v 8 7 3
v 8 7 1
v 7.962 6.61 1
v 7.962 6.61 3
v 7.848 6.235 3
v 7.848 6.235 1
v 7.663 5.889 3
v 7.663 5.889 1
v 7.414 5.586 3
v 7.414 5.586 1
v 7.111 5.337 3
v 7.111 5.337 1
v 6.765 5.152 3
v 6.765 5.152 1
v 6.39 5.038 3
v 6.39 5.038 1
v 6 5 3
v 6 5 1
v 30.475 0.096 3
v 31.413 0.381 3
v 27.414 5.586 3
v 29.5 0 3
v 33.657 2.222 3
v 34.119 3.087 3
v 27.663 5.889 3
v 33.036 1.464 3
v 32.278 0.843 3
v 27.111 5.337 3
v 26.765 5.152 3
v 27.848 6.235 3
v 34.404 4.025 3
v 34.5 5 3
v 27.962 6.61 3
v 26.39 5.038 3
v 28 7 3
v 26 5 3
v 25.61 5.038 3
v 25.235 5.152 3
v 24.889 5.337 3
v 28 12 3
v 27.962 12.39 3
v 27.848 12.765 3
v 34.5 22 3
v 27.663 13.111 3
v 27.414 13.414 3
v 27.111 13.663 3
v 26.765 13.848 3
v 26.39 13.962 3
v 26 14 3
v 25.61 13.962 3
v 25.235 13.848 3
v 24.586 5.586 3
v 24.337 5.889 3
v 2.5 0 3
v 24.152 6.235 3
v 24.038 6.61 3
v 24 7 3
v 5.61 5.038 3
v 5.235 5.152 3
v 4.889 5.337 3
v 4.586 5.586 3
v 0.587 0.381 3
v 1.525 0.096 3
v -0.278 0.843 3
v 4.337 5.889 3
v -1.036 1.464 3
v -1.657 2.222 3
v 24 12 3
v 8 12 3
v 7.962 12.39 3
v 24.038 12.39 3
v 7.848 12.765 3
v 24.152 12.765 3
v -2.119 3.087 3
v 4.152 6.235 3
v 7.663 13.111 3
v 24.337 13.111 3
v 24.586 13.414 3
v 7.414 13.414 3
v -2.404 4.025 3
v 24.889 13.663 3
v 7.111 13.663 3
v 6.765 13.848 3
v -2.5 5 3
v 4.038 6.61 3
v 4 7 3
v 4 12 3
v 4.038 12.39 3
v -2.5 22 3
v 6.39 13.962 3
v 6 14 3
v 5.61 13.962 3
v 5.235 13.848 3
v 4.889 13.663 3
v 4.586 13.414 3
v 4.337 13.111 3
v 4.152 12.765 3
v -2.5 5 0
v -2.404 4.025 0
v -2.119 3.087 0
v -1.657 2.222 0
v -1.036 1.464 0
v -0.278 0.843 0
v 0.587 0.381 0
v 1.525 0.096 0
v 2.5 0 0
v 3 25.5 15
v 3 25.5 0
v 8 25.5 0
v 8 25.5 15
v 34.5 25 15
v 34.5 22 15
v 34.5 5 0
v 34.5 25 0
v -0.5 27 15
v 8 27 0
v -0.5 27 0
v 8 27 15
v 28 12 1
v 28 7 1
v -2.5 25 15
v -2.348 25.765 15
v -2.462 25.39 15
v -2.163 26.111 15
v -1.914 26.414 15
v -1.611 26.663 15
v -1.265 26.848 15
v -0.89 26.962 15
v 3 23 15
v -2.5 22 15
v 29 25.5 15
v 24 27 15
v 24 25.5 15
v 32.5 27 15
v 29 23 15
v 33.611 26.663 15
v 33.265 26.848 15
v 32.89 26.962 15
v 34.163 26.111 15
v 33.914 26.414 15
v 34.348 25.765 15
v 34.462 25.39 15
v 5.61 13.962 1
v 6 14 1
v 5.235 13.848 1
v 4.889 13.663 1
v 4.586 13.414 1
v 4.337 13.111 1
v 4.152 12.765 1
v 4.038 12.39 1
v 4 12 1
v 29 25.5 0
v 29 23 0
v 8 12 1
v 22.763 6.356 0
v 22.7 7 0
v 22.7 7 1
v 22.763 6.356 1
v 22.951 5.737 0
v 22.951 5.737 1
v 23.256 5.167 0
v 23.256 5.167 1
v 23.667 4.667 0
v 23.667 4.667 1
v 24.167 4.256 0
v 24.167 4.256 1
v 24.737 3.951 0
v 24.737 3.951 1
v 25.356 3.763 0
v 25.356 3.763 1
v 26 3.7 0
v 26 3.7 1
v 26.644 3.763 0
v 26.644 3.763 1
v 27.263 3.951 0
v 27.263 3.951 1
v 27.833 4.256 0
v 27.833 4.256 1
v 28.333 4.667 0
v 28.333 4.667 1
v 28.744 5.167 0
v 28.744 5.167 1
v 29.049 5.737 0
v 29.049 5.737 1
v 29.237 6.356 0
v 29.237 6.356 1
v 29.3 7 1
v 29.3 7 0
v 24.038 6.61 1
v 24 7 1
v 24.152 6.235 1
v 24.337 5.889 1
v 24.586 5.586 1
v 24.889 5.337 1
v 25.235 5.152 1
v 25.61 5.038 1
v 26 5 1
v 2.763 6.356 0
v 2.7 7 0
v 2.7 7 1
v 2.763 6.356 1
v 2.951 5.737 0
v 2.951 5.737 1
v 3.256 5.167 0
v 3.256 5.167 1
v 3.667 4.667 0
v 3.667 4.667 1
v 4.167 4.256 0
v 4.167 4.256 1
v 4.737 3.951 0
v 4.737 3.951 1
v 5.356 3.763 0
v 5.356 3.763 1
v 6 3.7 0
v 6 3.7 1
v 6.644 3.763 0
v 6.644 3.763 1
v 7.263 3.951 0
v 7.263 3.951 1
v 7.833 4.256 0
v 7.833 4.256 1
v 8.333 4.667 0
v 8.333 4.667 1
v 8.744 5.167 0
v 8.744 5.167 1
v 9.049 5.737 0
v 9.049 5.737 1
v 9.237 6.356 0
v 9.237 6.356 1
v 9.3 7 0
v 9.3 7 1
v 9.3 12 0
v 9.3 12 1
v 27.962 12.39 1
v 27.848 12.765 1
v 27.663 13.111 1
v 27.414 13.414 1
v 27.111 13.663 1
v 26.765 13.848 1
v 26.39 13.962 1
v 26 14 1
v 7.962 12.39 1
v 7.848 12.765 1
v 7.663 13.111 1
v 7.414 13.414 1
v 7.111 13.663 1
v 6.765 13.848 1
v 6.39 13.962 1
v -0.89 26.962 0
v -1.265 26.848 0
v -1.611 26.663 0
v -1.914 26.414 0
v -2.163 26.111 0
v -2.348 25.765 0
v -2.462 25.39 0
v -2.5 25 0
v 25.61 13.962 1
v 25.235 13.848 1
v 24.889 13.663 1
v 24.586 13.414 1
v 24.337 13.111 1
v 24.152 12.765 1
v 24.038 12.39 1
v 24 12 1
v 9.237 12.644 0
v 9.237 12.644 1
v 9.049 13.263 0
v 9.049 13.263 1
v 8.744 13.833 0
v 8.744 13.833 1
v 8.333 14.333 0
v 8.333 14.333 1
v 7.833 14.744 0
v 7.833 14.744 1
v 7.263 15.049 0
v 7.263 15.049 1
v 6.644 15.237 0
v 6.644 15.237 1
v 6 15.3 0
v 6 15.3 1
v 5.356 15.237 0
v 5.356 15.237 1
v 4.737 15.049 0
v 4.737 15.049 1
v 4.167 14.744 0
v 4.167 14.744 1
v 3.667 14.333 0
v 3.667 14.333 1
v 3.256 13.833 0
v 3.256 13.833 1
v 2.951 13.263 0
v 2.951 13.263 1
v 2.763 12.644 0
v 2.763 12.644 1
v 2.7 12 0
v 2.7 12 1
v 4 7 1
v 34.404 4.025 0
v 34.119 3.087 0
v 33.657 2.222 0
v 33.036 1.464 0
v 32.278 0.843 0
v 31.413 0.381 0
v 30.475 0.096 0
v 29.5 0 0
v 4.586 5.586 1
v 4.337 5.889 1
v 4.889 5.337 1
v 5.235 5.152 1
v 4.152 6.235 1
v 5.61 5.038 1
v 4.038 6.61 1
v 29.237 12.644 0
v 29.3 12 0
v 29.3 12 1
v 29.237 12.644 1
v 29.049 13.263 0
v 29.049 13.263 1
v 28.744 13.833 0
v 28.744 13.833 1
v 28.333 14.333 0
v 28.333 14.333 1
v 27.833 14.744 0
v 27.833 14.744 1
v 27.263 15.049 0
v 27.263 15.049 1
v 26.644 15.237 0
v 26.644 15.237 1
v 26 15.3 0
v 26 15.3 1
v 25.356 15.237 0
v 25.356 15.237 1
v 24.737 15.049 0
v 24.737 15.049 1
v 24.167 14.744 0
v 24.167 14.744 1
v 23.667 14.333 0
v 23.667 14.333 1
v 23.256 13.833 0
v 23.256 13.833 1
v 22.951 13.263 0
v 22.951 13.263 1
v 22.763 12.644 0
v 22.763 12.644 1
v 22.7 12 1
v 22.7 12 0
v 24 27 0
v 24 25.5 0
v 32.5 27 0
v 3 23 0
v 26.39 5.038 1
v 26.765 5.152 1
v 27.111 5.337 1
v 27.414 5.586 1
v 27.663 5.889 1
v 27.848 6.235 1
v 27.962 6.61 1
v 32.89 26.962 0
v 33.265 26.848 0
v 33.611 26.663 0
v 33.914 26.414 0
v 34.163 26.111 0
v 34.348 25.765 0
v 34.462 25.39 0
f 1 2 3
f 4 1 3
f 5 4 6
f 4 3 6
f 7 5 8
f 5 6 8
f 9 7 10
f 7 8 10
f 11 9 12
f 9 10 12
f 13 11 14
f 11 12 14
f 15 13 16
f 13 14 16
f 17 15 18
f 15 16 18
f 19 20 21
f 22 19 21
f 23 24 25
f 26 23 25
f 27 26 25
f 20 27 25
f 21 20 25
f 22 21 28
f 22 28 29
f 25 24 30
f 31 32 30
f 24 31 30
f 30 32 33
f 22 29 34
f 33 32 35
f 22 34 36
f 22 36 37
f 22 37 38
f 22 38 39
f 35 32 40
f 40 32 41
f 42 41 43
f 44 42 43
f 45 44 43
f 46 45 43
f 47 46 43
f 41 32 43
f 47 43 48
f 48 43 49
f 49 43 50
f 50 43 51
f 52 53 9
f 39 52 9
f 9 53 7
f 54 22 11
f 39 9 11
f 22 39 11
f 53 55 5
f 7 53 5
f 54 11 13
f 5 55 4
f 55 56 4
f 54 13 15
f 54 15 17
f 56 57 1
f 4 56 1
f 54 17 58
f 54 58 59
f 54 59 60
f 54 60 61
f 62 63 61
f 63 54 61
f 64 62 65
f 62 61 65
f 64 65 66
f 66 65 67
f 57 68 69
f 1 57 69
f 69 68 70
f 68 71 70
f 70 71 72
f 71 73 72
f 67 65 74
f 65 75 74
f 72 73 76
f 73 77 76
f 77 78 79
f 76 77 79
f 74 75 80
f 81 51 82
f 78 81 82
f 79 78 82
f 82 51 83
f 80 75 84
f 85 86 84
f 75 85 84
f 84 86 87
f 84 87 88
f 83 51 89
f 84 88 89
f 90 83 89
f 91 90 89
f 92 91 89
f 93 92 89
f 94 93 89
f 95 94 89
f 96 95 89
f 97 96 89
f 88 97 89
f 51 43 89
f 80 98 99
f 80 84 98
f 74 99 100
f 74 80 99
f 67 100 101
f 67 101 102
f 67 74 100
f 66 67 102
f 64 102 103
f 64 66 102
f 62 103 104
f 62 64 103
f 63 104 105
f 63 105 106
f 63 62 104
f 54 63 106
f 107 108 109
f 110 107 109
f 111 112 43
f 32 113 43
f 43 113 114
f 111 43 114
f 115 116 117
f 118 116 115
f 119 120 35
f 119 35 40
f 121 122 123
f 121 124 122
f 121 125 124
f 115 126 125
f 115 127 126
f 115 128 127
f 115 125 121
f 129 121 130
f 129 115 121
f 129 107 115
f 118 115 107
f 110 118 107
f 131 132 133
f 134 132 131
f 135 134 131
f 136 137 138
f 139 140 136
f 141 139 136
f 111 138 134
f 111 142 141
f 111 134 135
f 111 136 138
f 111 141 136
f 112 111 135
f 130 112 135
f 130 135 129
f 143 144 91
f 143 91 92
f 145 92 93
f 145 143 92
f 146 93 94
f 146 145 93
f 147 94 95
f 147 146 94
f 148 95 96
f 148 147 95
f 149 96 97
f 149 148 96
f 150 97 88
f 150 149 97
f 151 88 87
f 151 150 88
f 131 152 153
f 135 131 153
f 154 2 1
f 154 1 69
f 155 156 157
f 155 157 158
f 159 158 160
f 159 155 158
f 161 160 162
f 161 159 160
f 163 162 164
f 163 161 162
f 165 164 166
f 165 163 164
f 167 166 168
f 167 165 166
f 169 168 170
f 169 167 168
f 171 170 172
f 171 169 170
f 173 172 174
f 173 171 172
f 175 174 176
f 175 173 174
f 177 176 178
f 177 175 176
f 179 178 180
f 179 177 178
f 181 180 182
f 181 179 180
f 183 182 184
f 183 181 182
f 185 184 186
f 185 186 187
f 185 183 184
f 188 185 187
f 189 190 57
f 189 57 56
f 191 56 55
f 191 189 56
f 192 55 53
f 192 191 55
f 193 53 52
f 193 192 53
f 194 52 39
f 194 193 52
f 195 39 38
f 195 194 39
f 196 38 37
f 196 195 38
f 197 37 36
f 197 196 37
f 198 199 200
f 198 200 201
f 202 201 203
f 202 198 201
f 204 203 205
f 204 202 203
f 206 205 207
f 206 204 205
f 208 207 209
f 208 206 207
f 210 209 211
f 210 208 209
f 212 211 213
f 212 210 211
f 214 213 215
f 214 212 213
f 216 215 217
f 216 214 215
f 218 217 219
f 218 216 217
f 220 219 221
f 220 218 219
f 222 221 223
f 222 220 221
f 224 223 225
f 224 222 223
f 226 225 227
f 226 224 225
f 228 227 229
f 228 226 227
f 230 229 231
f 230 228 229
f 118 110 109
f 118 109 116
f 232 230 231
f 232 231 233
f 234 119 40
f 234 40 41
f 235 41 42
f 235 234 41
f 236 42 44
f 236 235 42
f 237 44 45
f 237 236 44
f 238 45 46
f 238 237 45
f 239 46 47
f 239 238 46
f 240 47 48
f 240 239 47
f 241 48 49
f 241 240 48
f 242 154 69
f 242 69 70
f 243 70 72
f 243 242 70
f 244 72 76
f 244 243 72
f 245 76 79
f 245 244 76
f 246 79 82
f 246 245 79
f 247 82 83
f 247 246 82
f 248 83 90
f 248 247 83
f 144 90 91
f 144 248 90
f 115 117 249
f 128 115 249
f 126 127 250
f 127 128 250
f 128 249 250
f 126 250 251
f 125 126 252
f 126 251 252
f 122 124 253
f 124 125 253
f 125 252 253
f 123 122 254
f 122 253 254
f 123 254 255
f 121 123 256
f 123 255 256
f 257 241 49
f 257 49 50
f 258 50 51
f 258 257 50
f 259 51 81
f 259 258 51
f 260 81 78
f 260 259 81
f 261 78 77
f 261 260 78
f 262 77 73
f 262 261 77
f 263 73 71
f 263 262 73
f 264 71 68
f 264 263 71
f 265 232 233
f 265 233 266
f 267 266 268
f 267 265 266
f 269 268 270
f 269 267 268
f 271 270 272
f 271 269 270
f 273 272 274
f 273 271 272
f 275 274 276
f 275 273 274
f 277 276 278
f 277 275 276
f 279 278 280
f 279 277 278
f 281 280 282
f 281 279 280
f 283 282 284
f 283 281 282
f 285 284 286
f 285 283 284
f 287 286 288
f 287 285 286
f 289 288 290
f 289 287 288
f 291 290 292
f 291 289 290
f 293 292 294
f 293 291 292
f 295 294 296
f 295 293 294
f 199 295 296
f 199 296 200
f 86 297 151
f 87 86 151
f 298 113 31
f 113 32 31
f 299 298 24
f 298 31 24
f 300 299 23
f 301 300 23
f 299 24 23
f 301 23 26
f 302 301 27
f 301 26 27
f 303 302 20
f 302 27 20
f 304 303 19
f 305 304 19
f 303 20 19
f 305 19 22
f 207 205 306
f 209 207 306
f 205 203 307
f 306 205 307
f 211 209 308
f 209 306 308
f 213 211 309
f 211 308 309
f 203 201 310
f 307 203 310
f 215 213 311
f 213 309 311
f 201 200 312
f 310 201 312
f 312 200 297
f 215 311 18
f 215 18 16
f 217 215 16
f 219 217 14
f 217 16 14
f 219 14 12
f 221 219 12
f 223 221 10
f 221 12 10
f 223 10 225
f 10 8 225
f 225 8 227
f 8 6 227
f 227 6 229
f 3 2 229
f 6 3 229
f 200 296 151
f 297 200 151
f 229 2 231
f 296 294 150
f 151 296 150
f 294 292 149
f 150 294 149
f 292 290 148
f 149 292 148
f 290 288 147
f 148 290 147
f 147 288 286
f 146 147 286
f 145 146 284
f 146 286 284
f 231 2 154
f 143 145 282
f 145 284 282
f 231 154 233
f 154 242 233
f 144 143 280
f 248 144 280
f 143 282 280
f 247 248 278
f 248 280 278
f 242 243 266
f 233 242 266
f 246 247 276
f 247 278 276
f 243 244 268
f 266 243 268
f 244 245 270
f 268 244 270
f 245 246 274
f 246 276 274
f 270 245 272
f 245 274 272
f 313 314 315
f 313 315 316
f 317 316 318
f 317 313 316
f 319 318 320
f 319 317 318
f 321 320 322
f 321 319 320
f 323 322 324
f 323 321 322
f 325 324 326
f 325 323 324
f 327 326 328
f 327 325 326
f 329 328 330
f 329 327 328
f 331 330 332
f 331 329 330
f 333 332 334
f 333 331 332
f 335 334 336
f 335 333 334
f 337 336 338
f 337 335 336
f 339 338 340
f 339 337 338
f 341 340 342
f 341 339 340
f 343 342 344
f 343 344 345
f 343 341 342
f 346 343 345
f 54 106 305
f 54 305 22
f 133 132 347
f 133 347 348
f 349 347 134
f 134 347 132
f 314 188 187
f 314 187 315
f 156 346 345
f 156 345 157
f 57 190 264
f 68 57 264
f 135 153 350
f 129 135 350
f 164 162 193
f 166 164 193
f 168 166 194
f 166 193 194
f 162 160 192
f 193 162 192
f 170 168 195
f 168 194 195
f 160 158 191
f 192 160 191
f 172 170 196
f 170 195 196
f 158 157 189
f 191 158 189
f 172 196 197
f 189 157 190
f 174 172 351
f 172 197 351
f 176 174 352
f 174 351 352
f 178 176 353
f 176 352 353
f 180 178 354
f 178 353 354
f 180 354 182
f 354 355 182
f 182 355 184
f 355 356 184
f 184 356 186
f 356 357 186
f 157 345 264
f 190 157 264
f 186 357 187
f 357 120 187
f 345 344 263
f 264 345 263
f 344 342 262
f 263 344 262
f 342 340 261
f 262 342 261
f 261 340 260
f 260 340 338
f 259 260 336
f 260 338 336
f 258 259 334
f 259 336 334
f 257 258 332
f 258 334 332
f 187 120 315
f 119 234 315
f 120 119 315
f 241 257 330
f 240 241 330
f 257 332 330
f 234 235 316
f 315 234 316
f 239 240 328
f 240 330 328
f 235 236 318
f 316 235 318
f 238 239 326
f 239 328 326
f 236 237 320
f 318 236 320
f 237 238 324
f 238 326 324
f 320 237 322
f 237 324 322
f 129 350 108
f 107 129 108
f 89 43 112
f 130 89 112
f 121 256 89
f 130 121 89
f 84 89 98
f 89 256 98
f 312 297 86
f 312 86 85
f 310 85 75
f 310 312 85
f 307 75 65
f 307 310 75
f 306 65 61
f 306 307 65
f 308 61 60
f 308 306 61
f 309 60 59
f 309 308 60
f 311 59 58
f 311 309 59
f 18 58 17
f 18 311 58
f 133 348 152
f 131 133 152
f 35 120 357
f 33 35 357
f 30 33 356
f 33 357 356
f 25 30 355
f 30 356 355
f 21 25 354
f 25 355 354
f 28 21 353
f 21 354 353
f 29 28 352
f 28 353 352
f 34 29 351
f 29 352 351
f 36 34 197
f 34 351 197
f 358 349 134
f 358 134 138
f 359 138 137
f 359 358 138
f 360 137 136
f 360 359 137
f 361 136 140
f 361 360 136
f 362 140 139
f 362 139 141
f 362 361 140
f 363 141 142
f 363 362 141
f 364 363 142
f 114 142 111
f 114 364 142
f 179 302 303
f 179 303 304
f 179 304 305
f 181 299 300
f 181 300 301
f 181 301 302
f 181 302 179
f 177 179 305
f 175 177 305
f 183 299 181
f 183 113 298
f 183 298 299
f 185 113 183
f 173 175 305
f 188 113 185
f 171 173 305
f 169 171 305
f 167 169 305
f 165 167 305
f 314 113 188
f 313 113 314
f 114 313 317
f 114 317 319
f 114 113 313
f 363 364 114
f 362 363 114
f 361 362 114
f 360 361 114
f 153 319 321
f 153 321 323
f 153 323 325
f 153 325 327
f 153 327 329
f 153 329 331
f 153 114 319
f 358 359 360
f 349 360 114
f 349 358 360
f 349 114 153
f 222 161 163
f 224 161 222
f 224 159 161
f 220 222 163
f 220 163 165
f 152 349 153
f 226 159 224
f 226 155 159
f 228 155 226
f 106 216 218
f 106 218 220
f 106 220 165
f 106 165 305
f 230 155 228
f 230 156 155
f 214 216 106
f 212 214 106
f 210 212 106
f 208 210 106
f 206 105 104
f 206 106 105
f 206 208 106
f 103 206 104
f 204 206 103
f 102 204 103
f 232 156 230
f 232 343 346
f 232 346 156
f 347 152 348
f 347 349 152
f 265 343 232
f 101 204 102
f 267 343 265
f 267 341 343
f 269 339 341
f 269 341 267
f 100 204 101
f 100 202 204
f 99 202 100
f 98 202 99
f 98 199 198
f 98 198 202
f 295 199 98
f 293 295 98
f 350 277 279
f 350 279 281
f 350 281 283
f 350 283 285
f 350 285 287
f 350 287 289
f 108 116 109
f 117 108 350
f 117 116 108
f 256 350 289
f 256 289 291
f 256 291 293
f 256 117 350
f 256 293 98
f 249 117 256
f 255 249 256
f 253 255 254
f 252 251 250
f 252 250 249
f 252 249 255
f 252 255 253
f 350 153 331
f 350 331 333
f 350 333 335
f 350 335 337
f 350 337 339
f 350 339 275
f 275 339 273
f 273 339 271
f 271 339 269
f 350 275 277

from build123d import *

# Parameters (mm, degrees)
F0_W        = 16
F0_H        = 22
F0_W_2      = 4
F0_H_2      = 9
F1_DEPTH    = 3
F2_DEPTH    = 15
F3_DEPTH    = 2.5
F4_DEPTH    = 2.5
F5_T1_DEPTH = 3
F5_T3_DEPTH = 25
F7_W        = 4
F7_H        = 9
F8_DEPTH    = 1
F10_DEPTH   = 1
F11_R       = 5


# Not quite as in the source:
# - a fillet or chamfer that OpenCascade refuses, or shapes differently, is made with other operations: its cross-section is extruded or revolved along the edge and cut away or added
# - two fillets or chamfers of one size are made in one step


with BuildPart() as f1:
    # F0 (on Top) → F1 (new body)
    with BuildSketch(Plane.XY):
        with Locations((8, 11)):
            Rectangle(F0_W, F0_H)
        with Locations((6, 9.5)):
            Rectangle(F0_W_2, F0_H_2, mode=Mode.SUBTRACT)
        with Locations((24, 11)):
            Rectangle(F0_W, F0_H)
        with Locations((26, 9.5)):
            Rectangle(F0_W_2, F0_H_2, mode=Mode.SUBTRACT)
    extrude(amount=F1_DEPTH)

    # F0 (on Top) → F2 (join)
    with BuildSketch(Plane.XY):
        Polygon((0, 27), (0, 23), (3, 23), (3, 25.5), (8, 25.5), (8, 27), align=None)
        Polygon((0, 23), (0, 22), (16, 22), (16, 23), (3, 23), align=None)
        Polygon((16, 23), (16, 22), (32, 22), (32, 23), (29, 23), align=None)
        Polygon((29, 23), (32, 23), (32, 27), (24, 27), (24, 25.5), (29, 25.5), align=None)
    extrude(amount=F2_DEPTH)

    # F3 (add): a face of the model
    f3_faces = [f1.faces().sort_by_distance(p)[0] for p in [
        (32, 0.3088689042, 1.5),
    ]]
    extrude(f3_faces, amount=F3_DEPTH)

    # F4 (add): a face of the model
    f4_faces = [f1.faces().sort_by_distance(p)[0] for p in [
        (0, 0.3088689042, 1.5),
    ]]
    extrude(f4_faces, amount=F4_DEPTH)

    # F5: fillet of radius 2 on 10 edges, made by hand

    # F5_s2 → F5_t1 (join)
    with BuildSketch(Plane.XY):
        with BuildLine():
            ThreePointArc((28, 12), (27.4142135624, 13.4142135624), (26, 14))
            Line((26, 14), (28, 14))
            Line((28, 14), (28, 12))
        make_face()
        with BuildLine():
            ThreePointArc((28, 7), (27.4142135624, 5.5857864376), (26, 5))
            Line((26, 5), (28, 5))
            Line((28, 5), (28, 7))
        make_face()
        with BuildLine():
            ThreePointArc((26, 14), (24.5857864376, 13.4142135624), (24, 12))
            Line((24, 12), (24, 14))
            Line((24, 14), (26, 14))
        make_face()
        with BuildLine():
            ThreePointArc((24, 7), (24.5857864376, 5.5857864376), (26, 5))
            Line((26, 5), (24, 5))
            Line((24, 5), (24, 7))
        make_face()
        with BuildLine():
            ThreePointArc((8, 12), (7.4142135624, 13.4142135624), (6, 14))
            Line((6, 14), (8, 14))
            Line((8, 14), (8, 12))
        make_face()
        with BuildLine():
            ThreePointArc((8, 7), (7.4142135624, 5.5857864376), (6, 5))
            Line((6, 5), (8, 5))
            Line((8, 5), (8, 7))
        make_face()
        with BuildLine():
            ThreePointArc((6, 14), (4.5857864376, 13.4142135624), (4, 12))
            Line((4, 12), (4, 14))
            Line((4, 14), (6, 14))
        make_face()
        with BuildLine():
            ThreePointArc((4, 7), (4.5857864376, 5.5857864376), (6, 5))
            Line((6, 5), (4, 5))
            Line((4, 5), (4, 7))
        make_face()
    extrude(amount=F5_T1_DEPTH)

    # F5_s4 → F5_t3 (cut)
    with BuildSketch(Plane.XY.offset(-5)):
        with BuildLine():
            ThreePointArc((32.5, 27), (33.9142135624, 26.4142135624), (34.5, 25))
            Line((34.5, 25), (34.5, 27))
            Line((34.5, 27), (32.5, 27))
        make_face()
        with BuildLine():
            ThreePointArc((-0.5, 27), (-1.9142135624, 26.4142135624), (-2.5, 25))
            Line((-2.5, 25), (-2.5, 27))
            Line((-2.5, 27), (-0.5, 27))
        make_face()
    extrude(amount=F5_T3_DEPTH, mode=Mode.SUBTRACT)

    # F7 (on face) → F8 (cut)
    with BuildSketch(Plane.XY):
        with BuildLine():
            Line((2.7, 12), (2.7, 7))
            ThreePointArc((2.7000000011, 7), (6, 3.7000000011), (9.2999999989, 7))
            Line((9.3, 7), (9.3, 12))
            ThreePointArc((9.3, 12), (6, 15.3), (2.7, 12))
        make_face()
        with Locations((6, 9.5)):
            Rectangle(F7_W, F7_H, mode=Mode.SUBTRACT)
        with Locations((6, 9.5)):
            Rectangle(F7_W, F7_H)
    extrude(amount=F8_DEPTH, mode=Mode.SUBTRACT)

    # F9 (on face) → F10 (cut)
    with BuildSketch(Plane.XY):
        with BuildLine():
            Line((22.7, 12), (22.7, 7))
            ThreePointArc((22.7, 7), (26, 3.7), (29.3, 7))
            Line((29.3, 7), (29.3, 12))
            ThreePointArc((29.3, 12), (26, 15.3), (22.7, 12))
        make_face()
    extrude(amount=F10_DEPTH, mode=Mode.SUBTRACT)

    # F11
    f11_edges = [f1.edges().sort_by_distance(p)[0] for p in [
        (34.5, 0, 1.5),
        (-2.5, 0, 1.5),
    ]]
    fillet(f11_edges, radius=F11_R)


solid = f1.part
